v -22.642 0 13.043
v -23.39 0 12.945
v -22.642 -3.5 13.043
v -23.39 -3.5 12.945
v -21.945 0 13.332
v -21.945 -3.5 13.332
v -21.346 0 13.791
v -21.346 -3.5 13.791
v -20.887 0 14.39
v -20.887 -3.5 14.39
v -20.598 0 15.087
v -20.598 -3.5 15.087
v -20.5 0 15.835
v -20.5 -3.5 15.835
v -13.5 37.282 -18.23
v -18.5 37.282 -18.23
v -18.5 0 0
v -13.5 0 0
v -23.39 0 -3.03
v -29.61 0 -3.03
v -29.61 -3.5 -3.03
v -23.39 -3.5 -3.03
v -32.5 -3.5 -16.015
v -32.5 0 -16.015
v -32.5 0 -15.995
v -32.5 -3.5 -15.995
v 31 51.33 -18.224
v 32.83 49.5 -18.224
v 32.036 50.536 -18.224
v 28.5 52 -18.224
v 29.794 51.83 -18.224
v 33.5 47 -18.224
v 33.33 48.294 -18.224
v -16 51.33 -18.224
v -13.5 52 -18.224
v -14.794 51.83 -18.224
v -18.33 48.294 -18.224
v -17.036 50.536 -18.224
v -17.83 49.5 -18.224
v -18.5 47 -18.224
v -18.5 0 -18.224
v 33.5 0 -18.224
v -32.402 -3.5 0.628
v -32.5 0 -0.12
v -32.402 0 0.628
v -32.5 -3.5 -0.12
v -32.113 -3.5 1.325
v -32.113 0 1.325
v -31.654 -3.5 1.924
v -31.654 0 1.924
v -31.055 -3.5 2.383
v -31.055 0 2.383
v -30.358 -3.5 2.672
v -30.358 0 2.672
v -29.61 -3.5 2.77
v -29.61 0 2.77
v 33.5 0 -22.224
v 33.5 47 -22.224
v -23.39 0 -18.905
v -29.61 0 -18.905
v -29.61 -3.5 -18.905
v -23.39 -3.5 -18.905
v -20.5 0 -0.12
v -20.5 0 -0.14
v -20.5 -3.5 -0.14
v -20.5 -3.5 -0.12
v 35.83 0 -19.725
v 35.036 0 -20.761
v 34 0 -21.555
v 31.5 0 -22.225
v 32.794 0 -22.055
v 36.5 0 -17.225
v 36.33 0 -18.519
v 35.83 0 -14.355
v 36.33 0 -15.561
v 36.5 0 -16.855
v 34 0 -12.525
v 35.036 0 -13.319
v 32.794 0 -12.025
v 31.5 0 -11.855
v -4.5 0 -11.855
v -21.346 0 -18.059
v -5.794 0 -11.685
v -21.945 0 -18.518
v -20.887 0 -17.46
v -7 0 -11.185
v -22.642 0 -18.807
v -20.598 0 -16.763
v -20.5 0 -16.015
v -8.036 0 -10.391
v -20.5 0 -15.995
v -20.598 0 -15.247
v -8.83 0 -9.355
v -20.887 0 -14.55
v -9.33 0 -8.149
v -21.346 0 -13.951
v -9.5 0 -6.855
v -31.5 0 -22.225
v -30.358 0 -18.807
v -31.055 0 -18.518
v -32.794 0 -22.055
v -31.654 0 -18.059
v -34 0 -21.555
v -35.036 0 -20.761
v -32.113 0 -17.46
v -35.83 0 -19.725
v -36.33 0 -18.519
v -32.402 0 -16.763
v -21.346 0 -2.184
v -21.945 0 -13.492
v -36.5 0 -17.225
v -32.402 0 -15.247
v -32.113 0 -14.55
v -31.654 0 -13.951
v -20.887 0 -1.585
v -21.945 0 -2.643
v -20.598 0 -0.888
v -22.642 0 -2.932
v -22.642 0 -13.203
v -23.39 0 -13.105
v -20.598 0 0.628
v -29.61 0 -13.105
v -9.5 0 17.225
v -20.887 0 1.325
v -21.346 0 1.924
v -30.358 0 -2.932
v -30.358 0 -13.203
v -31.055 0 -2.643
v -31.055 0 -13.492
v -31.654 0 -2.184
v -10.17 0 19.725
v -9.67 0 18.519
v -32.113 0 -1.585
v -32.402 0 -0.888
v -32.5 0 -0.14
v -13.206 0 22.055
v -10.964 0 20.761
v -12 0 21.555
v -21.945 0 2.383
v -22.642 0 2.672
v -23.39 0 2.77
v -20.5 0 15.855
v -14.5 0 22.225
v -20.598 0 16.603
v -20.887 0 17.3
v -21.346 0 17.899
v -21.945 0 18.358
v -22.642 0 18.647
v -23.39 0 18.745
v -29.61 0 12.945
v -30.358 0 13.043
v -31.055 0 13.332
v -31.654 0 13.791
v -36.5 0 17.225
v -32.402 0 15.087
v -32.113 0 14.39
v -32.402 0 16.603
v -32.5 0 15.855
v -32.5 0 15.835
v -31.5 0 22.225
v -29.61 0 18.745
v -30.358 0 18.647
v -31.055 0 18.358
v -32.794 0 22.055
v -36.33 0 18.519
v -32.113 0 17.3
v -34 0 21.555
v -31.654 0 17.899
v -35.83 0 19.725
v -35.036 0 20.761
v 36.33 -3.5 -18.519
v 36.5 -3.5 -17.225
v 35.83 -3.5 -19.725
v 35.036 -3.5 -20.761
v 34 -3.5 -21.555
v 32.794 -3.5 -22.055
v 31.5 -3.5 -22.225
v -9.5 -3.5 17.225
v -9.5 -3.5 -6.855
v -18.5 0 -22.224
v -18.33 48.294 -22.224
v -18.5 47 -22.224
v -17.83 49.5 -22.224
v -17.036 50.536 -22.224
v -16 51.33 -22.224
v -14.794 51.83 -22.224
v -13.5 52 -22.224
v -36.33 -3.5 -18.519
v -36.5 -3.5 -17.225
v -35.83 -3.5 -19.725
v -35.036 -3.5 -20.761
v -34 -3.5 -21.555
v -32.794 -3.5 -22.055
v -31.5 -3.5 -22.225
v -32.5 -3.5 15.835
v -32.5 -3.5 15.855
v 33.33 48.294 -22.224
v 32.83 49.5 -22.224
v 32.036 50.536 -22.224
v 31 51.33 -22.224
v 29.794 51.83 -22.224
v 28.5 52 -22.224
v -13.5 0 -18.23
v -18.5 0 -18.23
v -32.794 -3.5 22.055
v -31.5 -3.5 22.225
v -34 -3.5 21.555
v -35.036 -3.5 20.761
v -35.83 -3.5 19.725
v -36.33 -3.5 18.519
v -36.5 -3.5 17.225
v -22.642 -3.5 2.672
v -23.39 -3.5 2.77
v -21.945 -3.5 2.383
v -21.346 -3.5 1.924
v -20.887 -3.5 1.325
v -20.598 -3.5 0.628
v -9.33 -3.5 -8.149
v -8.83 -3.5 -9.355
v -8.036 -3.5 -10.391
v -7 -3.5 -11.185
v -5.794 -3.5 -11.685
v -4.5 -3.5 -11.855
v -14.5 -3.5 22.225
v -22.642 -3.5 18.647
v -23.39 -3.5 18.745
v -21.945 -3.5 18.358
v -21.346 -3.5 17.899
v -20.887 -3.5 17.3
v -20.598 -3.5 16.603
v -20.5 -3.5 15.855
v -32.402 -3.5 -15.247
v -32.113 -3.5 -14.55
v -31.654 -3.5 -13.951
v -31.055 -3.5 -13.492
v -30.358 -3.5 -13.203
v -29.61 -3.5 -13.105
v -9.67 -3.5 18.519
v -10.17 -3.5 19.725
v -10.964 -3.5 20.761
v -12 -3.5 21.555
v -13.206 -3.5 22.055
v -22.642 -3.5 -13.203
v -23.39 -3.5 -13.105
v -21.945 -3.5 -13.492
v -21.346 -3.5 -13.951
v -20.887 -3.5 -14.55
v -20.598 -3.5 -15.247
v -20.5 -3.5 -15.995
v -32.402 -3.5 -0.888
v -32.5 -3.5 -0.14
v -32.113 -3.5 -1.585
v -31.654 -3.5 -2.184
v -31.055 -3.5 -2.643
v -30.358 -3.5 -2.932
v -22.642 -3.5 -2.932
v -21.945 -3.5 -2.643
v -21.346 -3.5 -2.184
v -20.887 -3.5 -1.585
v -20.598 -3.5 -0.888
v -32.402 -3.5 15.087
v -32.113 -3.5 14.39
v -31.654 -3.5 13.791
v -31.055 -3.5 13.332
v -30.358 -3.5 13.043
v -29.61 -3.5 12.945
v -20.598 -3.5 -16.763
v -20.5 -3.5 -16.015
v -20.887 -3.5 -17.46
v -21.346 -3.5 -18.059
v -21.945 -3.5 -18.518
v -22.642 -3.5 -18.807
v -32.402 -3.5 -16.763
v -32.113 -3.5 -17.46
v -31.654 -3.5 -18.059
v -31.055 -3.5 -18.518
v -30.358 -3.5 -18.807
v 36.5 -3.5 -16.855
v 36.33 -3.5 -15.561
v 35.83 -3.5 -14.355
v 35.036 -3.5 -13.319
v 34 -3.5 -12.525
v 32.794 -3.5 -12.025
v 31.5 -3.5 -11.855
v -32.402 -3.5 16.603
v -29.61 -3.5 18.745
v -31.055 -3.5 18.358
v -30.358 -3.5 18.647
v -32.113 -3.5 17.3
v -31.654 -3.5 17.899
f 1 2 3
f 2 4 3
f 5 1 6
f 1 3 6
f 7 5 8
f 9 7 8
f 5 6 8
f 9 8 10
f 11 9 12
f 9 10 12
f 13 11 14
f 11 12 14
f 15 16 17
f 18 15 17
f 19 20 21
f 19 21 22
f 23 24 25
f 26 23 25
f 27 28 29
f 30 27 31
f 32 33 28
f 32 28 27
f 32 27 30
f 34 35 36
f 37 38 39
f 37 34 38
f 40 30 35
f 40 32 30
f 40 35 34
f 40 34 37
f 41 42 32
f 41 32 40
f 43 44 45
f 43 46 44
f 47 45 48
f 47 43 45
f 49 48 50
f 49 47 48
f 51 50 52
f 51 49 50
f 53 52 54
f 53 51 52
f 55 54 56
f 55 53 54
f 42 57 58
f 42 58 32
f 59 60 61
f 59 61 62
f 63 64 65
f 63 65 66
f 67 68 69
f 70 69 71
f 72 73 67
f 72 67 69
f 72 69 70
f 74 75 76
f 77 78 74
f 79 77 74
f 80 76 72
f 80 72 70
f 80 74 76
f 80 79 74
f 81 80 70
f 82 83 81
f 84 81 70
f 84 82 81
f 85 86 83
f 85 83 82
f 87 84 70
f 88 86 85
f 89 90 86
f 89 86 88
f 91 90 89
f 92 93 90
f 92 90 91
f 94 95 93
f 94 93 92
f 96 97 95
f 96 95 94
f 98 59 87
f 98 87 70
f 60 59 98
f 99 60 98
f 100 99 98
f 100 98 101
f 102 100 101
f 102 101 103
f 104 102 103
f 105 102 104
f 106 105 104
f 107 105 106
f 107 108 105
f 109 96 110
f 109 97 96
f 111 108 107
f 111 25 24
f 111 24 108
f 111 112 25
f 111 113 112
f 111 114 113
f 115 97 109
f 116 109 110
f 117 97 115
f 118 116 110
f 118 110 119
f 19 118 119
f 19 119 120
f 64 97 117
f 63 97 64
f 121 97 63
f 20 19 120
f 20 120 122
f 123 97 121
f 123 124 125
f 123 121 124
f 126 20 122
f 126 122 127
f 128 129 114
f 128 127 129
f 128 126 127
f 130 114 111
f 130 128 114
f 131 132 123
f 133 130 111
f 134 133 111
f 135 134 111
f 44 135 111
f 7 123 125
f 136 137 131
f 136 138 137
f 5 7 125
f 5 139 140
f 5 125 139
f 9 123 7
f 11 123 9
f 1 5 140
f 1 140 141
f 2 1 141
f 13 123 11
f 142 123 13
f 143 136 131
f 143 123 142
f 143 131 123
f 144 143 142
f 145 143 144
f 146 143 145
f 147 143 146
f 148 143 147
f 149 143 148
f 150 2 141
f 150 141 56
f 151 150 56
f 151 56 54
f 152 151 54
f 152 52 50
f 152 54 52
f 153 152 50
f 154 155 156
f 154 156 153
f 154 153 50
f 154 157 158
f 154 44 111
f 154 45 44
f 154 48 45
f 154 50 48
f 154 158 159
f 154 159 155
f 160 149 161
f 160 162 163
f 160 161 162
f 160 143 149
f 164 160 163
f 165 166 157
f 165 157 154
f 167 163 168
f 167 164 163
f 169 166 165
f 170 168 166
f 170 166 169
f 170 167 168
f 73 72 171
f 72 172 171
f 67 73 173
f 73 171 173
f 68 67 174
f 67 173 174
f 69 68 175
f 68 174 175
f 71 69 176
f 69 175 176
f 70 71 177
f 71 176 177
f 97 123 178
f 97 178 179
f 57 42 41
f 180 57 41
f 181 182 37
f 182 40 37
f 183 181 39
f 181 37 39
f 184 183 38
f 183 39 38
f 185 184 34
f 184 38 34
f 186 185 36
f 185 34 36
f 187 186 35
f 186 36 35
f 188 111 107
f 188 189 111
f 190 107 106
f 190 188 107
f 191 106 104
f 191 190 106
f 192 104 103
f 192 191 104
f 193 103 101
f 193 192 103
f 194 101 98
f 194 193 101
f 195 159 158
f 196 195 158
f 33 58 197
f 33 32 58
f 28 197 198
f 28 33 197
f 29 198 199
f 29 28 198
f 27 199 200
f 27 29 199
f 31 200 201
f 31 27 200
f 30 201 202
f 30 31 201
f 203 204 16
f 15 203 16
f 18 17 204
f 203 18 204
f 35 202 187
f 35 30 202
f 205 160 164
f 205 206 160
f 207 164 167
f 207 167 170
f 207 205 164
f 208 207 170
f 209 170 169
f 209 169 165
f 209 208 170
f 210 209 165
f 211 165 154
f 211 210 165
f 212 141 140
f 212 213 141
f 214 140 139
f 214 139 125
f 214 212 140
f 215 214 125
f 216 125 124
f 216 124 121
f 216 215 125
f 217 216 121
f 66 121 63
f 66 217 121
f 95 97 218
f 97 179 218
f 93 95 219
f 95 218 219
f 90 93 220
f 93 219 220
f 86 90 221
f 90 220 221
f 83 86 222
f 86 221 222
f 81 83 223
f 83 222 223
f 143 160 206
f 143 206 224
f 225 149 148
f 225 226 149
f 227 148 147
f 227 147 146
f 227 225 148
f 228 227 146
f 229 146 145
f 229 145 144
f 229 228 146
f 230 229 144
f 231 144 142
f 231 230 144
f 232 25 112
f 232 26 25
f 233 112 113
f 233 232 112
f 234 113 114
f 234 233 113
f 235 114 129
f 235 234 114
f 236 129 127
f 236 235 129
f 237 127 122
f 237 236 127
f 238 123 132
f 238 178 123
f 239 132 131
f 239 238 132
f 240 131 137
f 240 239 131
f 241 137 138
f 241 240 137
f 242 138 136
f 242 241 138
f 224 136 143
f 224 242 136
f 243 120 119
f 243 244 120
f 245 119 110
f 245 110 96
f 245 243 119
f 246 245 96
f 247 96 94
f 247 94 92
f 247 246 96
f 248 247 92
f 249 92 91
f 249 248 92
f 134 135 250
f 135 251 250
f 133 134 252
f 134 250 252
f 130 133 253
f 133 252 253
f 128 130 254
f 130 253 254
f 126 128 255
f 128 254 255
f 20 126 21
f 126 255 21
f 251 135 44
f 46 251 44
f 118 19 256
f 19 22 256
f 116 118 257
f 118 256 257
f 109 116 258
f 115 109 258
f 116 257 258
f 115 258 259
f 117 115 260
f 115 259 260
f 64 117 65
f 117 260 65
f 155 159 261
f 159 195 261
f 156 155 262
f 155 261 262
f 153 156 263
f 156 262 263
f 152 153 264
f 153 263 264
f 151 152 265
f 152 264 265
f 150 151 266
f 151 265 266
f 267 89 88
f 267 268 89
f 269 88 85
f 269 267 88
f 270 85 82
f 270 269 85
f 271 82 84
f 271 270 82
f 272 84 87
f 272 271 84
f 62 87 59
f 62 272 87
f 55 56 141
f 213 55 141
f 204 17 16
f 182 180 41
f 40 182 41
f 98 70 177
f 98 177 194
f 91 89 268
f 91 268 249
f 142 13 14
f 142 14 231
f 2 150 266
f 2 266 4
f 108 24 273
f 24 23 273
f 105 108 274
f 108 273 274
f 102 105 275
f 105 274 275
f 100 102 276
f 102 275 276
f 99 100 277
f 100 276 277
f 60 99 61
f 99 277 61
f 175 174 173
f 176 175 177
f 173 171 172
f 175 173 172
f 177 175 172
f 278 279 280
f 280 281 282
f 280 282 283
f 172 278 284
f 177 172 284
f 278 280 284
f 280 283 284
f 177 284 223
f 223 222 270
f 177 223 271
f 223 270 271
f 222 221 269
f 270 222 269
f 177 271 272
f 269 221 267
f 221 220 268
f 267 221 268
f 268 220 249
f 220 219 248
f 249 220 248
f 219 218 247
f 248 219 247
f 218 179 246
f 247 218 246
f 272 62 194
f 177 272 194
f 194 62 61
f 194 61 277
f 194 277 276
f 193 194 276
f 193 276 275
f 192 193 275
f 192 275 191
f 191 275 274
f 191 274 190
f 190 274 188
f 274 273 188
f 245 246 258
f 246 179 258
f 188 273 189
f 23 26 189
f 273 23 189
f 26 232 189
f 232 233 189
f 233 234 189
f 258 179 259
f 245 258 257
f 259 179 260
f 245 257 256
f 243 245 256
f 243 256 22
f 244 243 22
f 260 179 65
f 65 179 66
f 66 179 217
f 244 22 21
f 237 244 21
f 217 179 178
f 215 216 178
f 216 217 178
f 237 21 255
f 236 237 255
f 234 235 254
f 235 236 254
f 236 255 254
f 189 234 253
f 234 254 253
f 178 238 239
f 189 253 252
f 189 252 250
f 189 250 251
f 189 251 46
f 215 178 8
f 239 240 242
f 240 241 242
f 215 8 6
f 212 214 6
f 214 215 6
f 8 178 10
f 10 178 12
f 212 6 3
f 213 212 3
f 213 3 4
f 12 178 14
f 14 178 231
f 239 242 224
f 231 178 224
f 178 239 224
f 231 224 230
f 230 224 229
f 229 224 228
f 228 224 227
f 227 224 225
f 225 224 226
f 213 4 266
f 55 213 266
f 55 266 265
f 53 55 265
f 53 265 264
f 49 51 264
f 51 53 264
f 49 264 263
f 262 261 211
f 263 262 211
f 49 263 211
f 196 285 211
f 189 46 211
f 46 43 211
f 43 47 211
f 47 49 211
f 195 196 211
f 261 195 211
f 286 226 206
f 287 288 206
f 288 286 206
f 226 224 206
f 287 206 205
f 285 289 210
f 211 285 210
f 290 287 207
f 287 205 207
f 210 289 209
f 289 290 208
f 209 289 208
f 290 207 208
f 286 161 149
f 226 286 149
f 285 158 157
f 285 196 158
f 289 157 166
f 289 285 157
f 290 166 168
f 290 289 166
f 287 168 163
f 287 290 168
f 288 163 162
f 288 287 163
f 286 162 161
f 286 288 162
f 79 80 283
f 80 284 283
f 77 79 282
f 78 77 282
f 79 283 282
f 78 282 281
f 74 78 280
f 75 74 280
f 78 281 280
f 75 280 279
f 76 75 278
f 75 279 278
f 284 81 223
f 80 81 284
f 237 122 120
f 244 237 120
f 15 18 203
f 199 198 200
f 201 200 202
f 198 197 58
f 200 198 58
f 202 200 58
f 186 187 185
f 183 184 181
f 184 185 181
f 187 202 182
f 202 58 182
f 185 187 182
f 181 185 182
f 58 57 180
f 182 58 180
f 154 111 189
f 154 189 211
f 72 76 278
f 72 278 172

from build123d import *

# Parameters (mm, degrees)
SKETCH001_W      = 52
SKETCH001_H      = 4
EXTRUDE001_DEPTH = 52
FILLET001_R      = 5
EXTRUDE002_DEPTH = 5
SKETCH_W         = 12
SKETCH_H         = 5.8
EXTRUDE_DEPTH    = 3.5
FILLET_R         = 5
FILLET002_R      = 2.89


with BuildPart() as holder:
    # Sketch001 → Extrude001 (new body)
    with BuildSketch(Plane(origin=(0, 0, 0), x_dir=(-1, 0, 0), z_dir=(0, 1, 0))):
        with Locations((-7.5, -20.224)):
            Rectangle(SKETCH001_W, SKETCH001_H)
    extrude(amount=EXTRUDE001_DEPTH)

    # Fillet001
    fillet001_edges = [holder.edges().sort_by_distance(p)[0] for p in [
        (-18.5, 52, -20.224),
        (33.5, 52, -20.224),
    ]]
    fillet(fillet001_edges, radius=FILLET001_R)


with BuildPart() as brace:
    # Sketch002 (on Face6 of Fillet001) → Extrude002 (new body)
    with BuildSketch(Plane(origin=(-18.5, 0, 0), x_dir=(0, -1, 0), z_dir=(-1, 0, 0))):
        Polygon((0, 0), (0, -18.23), (-37.281592, -18.23), align=None)
    extrude(amount=-EXTRUDE002_DEPTH)


with BuildPart() as round_inner:
    # Sketch → Extrude (new body)
    with BuildSketch(Plane.XZ):
        Polygon((-9.5, 22.225), (-9.5, -11.855), (36.5, -11.855), (36.5, -22.225), (-36.5, -22.225), (-36.5, 22.225), align=None)
        with Locations((-26.5, 15.845)):
            Rectangle(SKETCH_W, SKETCH_H, mode=Mode.SUBTRACT)
        with Locations((-26.5, -0.13)):
            Rectangle(SKETCH_W, SKETCH_H, mode=Mode.SUBTRACT)
        with Locations((-26.5, -16.005)):
            Rectangle(SKETCH_W, SKETCH_H, mode=Mode.SUBTRACT)
    extrude(amount=EXTRUDE_DEPTH)

    # Fillet
    fillet_edges = [round_inner.edges().sort_by_distance(p)[0] for p in [
        (-9.5, -1.75, 22.225),
        (-9.5, -1.75, -11.855),
        (36.5, -1.75, -11.855),
        (36.5, -1.75, -22.225),
        (-36.5, -1.75, -22.225),
        (-36.5, -1.75, 22.225),
    ]]
    fillet(fillet_edges, radius=FILLET_R)

    # Fillet002
    fillet002_edges = [round_inner.edges().sort_by_distance(p)[0] for p in [
        (-32.5, -1.75, -13.105),
        (-20.5, -1.75, -13.105),
        (-20.5, -1.75, -18.905),
        (-32.5, -1.75, -18.905),
        (-32.5, -1.75, 2.77),
        (-20.5, -1.75, 2.77),
        (-20.5, -1.75, -3.03),
        (-32.5, -1.75, -3.03),
        (-32.5, -1.75, 18.745),
        (-20.5, -1.75, 18.745),
        (-20.5, -1.75, 12.945),
        (-32.5, -1.75, 12.945),
    ]]
    fillet(fillet002_edges, radius=FILLET002_R)


solid = Compound([holder.part, brace.part, round_inner.part])
